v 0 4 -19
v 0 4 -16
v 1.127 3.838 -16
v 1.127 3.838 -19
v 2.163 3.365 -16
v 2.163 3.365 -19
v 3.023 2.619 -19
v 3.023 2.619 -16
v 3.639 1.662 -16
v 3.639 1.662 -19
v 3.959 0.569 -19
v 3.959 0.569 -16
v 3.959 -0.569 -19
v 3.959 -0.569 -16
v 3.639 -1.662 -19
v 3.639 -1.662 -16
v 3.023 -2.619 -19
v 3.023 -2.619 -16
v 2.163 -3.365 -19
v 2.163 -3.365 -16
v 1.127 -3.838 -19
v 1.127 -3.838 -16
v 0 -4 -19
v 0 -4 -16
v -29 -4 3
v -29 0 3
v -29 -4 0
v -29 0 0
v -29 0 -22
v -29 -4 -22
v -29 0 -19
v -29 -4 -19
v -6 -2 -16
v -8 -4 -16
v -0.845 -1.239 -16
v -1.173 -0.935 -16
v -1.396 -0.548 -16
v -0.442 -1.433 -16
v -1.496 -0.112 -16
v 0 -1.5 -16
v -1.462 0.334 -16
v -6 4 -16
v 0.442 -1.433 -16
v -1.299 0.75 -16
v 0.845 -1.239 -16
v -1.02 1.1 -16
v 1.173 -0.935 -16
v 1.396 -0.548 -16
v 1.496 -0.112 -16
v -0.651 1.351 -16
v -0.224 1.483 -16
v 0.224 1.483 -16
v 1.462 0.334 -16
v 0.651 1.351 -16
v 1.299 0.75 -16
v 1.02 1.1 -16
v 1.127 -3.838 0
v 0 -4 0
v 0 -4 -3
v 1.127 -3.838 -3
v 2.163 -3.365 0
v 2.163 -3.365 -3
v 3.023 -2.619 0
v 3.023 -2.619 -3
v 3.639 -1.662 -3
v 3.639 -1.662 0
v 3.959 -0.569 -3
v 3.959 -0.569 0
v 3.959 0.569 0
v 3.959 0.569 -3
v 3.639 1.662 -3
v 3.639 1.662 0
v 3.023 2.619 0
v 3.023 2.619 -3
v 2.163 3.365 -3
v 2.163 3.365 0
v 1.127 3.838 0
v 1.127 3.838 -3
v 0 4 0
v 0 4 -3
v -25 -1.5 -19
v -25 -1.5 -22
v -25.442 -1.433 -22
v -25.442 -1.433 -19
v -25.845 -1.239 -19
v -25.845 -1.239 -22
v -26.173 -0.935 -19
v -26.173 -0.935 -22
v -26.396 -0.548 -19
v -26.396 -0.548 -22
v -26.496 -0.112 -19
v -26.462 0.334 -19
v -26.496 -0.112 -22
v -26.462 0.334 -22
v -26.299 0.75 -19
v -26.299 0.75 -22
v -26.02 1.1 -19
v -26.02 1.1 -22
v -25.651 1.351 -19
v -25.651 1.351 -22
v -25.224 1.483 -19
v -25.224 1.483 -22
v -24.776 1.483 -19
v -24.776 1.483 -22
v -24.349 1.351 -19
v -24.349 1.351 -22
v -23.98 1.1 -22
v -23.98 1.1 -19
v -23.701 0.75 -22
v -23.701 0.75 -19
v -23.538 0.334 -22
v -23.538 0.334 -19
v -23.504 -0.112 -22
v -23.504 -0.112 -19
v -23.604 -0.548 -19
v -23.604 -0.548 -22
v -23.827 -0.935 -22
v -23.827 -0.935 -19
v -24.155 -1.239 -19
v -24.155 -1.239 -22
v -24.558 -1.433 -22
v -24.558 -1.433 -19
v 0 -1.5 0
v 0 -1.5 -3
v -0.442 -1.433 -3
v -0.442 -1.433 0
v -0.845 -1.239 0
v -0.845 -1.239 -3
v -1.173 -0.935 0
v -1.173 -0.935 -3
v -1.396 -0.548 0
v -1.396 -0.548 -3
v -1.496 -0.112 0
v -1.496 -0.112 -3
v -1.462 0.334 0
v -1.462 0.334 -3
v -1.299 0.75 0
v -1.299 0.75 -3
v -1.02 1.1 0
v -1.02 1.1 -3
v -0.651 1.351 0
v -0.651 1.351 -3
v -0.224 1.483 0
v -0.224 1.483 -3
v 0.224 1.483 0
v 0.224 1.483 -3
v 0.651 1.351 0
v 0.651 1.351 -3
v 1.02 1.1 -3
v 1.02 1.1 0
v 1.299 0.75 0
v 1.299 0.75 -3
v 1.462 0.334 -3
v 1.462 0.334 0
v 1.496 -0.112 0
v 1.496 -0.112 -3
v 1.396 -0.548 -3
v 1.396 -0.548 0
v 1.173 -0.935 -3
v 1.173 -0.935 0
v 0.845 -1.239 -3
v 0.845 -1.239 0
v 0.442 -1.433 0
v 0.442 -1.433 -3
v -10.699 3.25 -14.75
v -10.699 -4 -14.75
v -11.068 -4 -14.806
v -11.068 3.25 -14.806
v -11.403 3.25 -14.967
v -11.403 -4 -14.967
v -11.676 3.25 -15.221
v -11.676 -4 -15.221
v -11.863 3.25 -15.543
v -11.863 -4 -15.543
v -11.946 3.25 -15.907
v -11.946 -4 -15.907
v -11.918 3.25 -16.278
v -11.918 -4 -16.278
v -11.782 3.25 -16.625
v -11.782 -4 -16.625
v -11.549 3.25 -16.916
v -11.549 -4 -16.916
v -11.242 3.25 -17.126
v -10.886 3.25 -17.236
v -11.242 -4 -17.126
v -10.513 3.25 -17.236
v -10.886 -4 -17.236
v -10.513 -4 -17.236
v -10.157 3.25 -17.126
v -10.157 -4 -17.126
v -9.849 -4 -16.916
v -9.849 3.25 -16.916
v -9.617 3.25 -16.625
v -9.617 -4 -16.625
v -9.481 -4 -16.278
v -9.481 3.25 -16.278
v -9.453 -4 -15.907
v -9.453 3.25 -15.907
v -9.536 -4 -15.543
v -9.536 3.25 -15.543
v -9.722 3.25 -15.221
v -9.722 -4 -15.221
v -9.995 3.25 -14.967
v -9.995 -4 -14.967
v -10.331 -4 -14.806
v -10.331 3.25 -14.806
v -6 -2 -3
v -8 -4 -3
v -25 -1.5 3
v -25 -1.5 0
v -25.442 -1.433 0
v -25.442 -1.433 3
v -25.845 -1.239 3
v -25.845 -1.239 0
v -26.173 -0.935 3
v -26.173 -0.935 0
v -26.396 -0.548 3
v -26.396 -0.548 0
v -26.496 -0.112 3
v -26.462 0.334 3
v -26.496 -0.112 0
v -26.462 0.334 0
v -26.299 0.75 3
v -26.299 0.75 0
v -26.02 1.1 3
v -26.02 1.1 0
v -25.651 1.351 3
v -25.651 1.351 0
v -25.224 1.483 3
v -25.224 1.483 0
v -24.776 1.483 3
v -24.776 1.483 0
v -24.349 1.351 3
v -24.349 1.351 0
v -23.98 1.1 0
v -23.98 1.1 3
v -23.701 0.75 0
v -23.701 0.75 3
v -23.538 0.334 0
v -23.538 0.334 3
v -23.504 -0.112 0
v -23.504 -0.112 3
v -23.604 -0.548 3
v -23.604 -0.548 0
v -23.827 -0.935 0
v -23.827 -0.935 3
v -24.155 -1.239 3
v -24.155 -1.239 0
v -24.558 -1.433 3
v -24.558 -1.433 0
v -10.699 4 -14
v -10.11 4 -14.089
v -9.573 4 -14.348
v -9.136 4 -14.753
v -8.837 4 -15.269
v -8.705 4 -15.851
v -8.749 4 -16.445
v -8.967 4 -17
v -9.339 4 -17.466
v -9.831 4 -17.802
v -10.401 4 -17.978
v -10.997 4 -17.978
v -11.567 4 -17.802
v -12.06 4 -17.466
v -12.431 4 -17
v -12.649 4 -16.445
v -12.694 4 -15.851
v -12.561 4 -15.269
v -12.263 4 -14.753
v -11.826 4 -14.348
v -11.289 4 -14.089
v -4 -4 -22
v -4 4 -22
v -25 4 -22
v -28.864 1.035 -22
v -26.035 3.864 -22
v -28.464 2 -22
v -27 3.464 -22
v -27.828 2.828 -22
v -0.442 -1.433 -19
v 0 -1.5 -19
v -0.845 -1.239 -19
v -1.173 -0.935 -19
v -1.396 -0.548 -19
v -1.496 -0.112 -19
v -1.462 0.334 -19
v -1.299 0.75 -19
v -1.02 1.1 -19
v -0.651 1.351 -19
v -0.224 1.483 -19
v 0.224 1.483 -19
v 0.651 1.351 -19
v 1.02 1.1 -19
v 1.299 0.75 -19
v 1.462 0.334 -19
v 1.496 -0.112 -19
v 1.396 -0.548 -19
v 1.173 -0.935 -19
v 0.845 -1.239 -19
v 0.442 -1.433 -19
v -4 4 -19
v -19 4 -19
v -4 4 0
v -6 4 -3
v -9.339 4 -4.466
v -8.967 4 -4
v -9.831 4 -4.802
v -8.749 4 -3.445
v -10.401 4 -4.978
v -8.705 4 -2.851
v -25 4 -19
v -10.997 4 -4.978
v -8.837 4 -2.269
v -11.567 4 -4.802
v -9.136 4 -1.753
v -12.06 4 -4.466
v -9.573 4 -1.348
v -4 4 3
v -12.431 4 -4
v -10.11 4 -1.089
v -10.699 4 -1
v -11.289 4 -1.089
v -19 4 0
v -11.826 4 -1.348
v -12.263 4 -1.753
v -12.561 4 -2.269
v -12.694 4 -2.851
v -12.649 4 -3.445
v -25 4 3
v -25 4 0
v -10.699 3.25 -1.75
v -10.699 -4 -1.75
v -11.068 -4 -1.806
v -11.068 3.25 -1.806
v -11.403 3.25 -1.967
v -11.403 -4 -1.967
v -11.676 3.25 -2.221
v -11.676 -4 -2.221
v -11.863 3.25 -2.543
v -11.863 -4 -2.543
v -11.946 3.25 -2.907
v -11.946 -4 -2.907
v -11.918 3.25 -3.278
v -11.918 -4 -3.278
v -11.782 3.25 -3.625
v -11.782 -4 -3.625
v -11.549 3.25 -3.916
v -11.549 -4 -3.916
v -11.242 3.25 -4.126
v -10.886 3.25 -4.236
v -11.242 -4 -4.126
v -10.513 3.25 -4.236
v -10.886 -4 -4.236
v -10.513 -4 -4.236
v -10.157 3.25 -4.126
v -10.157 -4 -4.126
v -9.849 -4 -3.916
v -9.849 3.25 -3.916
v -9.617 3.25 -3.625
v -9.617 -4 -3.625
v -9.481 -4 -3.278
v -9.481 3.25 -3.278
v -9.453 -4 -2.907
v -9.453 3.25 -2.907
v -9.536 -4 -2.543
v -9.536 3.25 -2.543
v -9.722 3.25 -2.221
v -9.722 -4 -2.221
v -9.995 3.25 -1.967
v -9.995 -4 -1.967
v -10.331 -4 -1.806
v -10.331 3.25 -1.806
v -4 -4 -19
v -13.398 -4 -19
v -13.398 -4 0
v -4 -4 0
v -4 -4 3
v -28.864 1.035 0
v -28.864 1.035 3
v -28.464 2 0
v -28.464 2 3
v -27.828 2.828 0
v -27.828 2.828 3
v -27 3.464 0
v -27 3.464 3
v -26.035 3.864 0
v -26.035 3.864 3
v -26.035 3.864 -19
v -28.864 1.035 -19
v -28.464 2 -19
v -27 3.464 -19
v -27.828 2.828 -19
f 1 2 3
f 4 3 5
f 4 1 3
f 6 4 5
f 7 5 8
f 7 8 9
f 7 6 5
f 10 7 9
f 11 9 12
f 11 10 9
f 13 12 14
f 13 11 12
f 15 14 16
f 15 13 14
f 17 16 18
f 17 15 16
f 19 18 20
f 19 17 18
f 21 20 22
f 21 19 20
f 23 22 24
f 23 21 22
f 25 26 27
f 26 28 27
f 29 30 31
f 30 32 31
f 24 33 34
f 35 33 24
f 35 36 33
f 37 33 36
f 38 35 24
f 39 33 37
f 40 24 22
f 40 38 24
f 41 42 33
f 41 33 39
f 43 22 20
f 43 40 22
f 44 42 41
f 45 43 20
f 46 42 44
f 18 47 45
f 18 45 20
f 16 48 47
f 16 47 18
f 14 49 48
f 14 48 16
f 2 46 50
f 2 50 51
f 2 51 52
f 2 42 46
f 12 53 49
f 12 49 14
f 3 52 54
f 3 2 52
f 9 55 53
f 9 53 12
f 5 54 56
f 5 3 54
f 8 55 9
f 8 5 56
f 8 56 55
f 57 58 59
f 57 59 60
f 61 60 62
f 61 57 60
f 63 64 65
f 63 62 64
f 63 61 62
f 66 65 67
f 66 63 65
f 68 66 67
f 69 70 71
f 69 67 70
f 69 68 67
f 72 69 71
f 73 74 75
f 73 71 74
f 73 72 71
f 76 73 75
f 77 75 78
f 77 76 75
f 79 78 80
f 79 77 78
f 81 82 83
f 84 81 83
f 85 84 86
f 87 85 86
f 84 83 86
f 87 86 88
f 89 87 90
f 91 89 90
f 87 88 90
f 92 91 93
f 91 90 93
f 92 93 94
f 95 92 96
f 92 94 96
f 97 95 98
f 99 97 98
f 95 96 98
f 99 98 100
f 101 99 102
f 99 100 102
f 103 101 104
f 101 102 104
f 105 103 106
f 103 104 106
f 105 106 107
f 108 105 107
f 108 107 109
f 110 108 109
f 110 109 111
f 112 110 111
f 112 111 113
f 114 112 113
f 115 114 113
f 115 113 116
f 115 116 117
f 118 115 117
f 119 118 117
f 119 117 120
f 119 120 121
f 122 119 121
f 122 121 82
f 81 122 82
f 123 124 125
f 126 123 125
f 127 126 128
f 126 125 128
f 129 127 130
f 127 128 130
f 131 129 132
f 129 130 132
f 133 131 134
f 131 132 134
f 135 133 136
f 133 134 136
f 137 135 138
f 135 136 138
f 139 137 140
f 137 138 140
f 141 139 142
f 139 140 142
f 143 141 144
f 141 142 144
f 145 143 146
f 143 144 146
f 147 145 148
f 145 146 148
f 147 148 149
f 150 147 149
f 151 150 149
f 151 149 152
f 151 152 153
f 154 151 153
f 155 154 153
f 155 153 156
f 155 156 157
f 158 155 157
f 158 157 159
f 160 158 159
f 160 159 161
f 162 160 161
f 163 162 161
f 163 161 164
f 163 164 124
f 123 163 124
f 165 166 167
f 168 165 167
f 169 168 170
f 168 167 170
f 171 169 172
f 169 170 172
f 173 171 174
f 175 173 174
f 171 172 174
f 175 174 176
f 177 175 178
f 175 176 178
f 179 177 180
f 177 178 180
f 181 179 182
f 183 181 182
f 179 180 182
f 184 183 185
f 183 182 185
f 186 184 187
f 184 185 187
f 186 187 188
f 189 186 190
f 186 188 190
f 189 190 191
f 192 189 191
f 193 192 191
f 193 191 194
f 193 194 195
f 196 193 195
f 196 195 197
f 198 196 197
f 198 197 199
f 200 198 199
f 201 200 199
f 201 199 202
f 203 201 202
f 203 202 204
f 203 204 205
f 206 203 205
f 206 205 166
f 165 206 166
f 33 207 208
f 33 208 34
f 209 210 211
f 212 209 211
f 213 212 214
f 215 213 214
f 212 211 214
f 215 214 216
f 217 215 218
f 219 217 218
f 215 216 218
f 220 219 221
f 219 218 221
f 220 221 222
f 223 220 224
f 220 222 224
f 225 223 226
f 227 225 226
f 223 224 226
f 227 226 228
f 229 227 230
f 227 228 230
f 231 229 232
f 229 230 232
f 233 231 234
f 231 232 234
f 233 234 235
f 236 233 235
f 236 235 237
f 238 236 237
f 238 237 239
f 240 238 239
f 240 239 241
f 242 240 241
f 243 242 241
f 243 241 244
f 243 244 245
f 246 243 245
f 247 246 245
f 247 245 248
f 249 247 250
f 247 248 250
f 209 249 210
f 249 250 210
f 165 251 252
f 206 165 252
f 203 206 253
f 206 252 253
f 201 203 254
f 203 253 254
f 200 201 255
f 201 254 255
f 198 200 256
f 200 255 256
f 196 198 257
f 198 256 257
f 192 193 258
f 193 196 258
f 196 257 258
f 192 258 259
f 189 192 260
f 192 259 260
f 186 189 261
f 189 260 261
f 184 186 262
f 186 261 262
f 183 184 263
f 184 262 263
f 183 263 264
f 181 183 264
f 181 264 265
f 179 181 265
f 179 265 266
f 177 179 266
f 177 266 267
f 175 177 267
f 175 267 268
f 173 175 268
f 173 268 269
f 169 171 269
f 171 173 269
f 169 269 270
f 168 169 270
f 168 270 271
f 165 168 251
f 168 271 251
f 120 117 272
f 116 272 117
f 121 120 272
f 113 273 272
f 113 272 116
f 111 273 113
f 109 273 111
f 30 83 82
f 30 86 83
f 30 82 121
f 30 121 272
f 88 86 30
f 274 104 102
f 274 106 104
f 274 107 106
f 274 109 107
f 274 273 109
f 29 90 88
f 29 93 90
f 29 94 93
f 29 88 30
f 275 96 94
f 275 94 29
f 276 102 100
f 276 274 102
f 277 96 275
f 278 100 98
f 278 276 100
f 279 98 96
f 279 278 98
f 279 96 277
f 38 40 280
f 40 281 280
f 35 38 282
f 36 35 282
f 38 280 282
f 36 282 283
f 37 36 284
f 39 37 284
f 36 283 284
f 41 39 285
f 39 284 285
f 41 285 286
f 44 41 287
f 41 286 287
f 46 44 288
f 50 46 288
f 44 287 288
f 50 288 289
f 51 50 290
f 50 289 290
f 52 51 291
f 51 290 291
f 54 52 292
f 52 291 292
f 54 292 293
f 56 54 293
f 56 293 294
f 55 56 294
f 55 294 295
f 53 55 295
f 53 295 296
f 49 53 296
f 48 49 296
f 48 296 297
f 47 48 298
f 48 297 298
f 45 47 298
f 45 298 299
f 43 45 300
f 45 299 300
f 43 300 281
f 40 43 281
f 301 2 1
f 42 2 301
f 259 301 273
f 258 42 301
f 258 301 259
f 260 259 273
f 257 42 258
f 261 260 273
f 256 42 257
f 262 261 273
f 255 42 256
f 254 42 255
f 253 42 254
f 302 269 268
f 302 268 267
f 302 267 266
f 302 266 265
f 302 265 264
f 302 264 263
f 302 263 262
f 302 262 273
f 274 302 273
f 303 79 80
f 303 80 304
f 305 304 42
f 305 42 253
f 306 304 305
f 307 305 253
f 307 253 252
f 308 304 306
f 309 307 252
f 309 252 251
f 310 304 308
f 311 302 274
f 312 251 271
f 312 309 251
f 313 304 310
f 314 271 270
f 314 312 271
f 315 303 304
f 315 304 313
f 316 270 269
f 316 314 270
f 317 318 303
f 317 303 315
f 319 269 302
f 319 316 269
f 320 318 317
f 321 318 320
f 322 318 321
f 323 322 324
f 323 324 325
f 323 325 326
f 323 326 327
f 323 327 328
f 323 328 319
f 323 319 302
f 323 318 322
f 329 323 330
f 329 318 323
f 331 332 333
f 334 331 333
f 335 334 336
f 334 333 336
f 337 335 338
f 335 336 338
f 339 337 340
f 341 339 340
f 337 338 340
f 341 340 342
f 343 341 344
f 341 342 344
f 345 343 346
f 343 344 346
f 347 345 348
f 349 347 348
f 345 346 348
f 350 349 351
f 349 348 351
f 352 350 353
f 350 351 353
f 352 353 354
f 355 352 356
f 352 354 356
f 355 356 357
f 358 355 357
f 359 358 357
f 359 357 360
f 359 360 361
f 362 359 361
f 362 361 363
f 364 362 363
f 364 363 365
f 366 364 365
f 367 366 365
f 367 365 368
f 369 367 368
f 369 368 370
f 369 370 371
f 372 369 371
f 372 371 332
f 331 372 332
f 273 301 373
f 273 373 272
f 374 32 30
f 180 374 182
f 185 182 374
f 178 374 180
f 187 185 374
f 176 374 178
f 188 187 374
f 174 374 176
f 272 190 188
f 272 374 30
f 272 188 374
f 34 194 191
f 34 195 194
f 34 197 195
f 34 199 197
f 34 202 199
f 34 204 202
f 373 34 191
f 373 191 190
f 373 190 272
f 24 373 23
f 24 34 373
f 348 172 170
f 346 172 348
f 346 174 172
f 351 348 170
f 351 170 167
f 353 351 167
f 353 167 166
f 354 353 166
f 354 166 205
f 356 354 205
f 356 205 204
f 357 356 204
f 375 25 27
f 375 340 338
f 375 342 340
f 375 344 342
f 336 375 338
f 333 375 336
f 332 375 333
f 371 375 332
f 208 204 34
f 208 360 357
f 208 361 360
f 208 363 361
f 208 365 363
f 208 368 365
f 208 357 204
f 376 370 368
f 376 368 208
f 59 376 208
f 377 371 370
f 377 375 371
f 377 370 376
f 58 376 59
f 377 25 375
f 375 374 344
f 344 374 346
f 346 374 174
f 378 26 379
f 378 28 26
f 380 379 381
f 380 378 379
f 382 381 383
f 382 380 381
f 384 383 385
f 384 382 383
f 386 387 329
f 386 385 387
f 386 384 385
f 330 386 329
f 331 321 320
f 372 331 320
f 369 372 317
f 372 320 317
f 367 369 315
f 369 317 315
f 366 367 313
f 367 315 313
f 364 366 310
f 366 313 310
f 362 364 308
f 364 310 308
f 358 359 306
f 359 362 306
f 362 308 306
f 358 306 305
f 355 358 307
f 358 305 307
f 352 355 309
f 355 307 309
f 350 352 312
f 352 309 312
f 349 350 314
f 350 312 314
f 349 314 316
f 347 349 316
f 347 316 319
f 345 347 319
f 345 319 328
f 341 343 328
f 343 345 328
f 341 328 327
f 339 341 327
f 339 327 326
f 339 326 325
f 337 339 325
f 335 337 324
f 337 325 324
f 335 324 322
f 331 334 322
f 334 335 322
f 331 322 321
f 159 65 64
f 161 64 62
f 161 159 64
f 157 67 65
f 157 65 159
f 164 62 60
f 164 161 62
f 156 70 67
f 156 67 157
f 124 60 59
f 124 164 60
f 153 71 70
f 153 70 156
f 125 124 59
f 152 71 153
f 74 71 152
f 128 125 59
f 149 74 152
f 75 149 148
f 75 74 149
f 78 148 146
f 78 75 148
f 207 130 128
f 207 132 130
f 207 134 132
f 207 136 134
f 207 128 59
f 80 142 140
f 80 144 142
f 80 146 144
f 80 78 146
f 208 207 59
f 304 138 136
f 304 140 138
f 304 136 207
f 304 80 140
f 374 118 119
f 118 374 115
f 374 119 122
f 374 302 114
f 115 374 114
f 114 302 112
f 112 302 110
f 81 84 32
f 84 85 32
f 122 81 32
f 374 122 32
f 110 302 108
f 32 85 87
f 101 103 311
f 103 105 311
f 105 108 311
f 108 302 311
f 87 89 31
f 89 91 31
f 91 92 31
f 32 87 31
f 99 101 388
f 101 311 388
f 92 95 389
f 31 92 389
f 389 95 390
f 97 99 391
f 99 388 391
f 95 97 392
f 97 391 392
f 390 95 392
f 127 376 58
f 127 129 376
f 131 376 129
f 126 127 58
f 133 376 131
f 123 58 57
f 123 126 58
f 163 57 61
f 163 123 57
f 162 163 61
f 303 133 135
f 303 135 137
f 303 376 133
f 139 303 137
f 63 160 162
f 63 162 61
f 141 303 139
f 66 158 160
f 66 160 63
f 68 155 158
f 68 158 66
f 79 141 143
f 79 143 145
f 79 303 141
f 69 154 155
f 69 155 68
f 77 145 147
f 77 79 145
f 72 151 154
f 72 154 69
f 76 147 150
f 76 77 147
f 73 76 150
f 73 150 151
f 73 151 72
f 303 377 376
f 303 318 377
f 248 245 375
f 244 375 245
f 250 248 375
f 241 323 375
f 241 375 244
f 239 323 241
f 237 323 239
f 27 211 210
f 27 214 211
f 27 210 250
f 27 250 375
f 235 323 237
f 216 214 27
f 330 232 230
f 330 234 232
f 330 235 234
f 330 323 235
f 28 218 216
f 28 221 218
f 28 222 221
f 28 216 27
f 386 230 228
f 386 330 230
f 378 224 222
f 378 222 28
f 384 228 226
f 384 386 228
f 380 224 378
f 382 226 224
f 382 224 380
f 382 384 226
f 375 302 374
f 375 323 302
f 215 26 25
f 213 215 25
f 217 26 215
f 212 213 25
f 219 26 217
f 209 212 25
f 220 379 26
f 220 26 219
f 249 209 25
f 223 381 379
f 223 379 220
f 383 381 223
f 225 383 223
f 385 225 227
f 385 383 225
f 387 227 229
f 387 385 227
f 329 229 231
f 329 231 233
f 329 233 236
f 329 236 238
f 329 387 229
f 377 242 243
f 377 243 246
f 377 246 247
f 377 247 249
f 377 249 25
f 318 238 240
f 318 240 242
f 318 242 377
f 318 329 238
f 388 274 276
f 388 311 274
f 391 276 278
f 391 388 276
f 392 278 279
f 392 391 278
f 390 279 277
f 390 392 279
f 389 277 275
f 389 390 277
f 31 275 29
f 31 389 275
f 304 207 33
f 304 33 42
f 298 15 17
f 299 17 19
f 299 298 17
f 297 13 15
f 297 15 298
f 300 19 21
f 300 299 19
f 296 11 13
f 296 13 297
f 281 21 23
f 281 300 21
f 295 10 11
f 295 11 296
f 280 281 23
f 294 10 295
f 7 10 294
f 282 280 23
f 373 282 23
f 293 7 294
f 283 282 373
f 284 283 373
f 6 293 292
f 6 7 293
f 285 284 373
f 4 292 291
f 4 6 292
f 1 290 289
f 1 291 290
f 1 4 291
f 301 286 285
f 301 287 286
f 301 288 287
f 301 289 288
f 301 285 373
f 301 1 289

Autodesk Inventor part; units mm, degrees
ref_plane "YZ Plane" through (0, 0, 0) normal (1, 0, 0) x (0, 1, 0)
ref_plane "XZ Plane" through (0, 0, 0) normal (0, 1, 0) x (-1, 0, 0)
ref_plane "XY Plane" through (0, 0, 0) normal (0, 0, 1) x (1, 0, 0)
sketch "Skizze1" plane through (0, 0, 0) normal (0, 0, 1) x (1, 0, 0)
  circle A0 centre (0, 0) radius 4 construction
  circle A1 centre (-25, 0) radius 4 construction
  line L0 (-25, 0) -> (0, 0) construction
  line L1 (-29, 0) -> (-29, -4)
  line L2 (-29, -4) -> (0, -4)
  line L3 (0, 4) -> (-25, 4)
  arc A2 (-25, 4) -> (-29, 0) centre (-25, 0) ccw
  arc A3 (0, -4) -> (0, 4) centre (0, 0) ccw
  dimension "d0" = 8
  dimension "d1" = 25
extrude "Extrusion1" add sketch "Skizze1" along normal blind 3
sketch "Skizze2" plane through (0, 0, 0) normal (0, 0, -1) x (-1, 0, 0)
  arc A0 (29, 0) -> (25, 4) centre (25, 0) ccw projected
  line L0 (0, 4) -> (25, 4) projected
  arc A1 (0, 4) -> (0, -4) centre (0, 0) ccw projected
  line L1 (29, -4) -> (0, -4) projected
  line L2 (6, 4) -> (19, 4)
  line L3 (19, 4) -> (19, -4)
  line L4 (19, -4) -> (6, -4)
  line L5 (6, -4) -> (6, 4)
  dimension "d4" = 4
  dimension "d5" = 6
  dimension "d6" = 6
extrude "Extrusion2" add sketch "Skizze2" along normal blind 9.5 contours L0 L3 L1 L5
sketch "Skizze3" plane through (0, 0, 0) normal (0, 0, -1) x (-1, 0, 0)
  line L0 (6, -4) -> (6, 4) projected
  line L1 (0, 4) -> (6, 4) projected
  arc A0 (0, 4) -> (0, -4) centre (0, 0) ccw projected
  line L2 (6, -4) -> (0, -4) projected
extrude "Extrusion3" add sketch "Skizze3" along normal blind 3
sketch "Skizze4" plane through (0, 0, 3) normal (0, 0, 1) x (1, 0, 0)
  line L0 (-6, 4) -> (-6, -4) projected
  line L1 (-6, 4) -> (0, 4) projected
  arc A0 (0, -4) -> (0, 4) centre (0, 0) ccw projected
  line L2 (0, -4) -> (-6, -4) projected
extrude "Extrusion4" cut sketch "Skizze4" against normal blind 3
mirror "Spiegeln1" about plane through (-12.5, 0, -9.5) normal (0, 0, -1)
sketch "Skizze5" plane through (0, 0, 0) normal (0, 0, -1) x (-1, 0, 0)
  line L0 (19, 4) -> (19, -4) projected
  line L1 (19, 4) -> (25, 4) projected
  line L2 (19, 4) -> (13.3983, -4)
  line L3 (13.3983, -4) -> (19, -4)
  point P0 (0, 0)
  dimension "d13" = 35
extrude "Extrusion5" cut sketch "Skizze5" along normal up to surface (19 mm away)
sketch "Skizze6" plane through (0, 0, 3) normal (0, 0, 1) x (1, 0, 0)
  arc A0 (-25, 4) -> (-29, 0) centre (-25, 0) ccw projected
  point P0 (0, 0)
hole "Bohrung1" at (-25, 0, 3) direction (0, 0, -1) diameter 3 end through all
hole "Bohrung2" at (0, 0, 3) direction (0, 0, -1) diameter 3 end through all
sketch "Skizze7" plane through (-6, -4, 3) normal (1, 0, 0) x (0, 0, -1)
  line L0 (0, 0) -> (0, 8) projected
  line L1 (3, 0) -> (0, 0) projected
  line L2 (3, 0) -> (3, 8) projected
  line L3 (0, 8) -> (3, 8) projected
  line L4 (22, 0) -> (25, 0) projected
  line L5 (25, 0) -> (25, 8) projected
  line L6 (25, 8) -> (22, 8) projected
  line L7 (22, 0) -> (22, 8) projected
  line L8 (22, 0) -> (25, 0) projected
  point P0 (3, 4)
extrude "Extrusion6" add sketch "Skizze7" along normal blind 2
chamfer "Fase1" distance 2 angle 45 1 edges at (-6, -4, -9.5)
sketch "Skizze8" plane through (-25, 4, 3) normal (0, 1, 0) x (1, 0, 0)
  line L0 (17, 19) -> (25, 19) projected
  line L1 (17, 6) -> (17, 19) projected
  line L2 (25, 6) -> (17, 6) projected
  line L3 (25, 6) -> (25, 3) projected
  line L4 (25, 3) -> (21, 3) projected
  line L5 (21, 0) -> (21, 3) projected
  line L6 (-4, 0) -> (21, 0) projected
  line L7 (-4, 3) -> (-4, 0) projected
  line L8 (-4, 3) -> (11.6017, 3) projected
  line L9 (11.6017, 3) -> (11.6017, 22) projected
  line L10 (11.6017, 22) -> (-4, 22) projected
  line L11 (-4, 22) -> (-4, 25) projected
  line L12 (-4, 25) -> (21, 25) projected
  line L13 (21, 22) -> (21, 25) projected
  line L14 (25, 22) -> (21, 22) projected
  line L15 (25, 19) -> (25, 22) projected
  line L16 (17, 19) -> (11.6017, 19)
  line L17 (17, 6) -> (11.6017, 6)
  point P0 (14.3008, 19)
  point P1 (14.3008, 6)
hole "Bohrung3" at (-10.6992, 4, -16) at (-10.6992, 4, -3) direction (0, -1, 0) diameter 2.5 end through all countersink diameter 4 countersink angle 90
sketch "Skizze9" plane through (0, 0, 0) normal (0, 0, 1) x (1, 0, 0)
  line L0 (-4, 4) -> (-4, -4) projected
  line L1 (0, -4) -> (-4, -4) projected
  arc A0 (0, -4) -> (0, 4) centre (0, 0) ccw projected
  line L2 (-4, 4) -> (0, 4) projected
  circle A1 centre (0, 0) radius 1.5 projected
  circle A2 centre (0, 0) radius 4
equation "\"d0\" = Finger_diameter"
equation "\"d1\" = FingerLaenge_B"
equation "\"d2\" = FingerWall"
equation "\"d5\" = 1.5 * d4"
equation "\"d6\" = d5"
equation "\"d7\" = -0.5 * FingerWall + 0.5 * Finger_width"
equation "\"d9\" = FingerWall"
equation "\"d11\" = FingerWall"
equation "\"d29\" = bearingHole"
equation "\"FingerLaenge_B\" = 25"
equation "\"Hebel_B\" = 25"
equation "\"Finger_width\" = 22"
equation "\"Finger_diameter\" = 8"
equation "\"FingerWall\" = 3"
equation "\"Hebel_basis_2\" = 15"
equation "\"Join_width\" = 3"
equation "\"bearingHole\" = 3"
equation "\"bearingWall\" = 4"
equation "\"support_D\" = 0.25"
properties part number "FingerPartB"
